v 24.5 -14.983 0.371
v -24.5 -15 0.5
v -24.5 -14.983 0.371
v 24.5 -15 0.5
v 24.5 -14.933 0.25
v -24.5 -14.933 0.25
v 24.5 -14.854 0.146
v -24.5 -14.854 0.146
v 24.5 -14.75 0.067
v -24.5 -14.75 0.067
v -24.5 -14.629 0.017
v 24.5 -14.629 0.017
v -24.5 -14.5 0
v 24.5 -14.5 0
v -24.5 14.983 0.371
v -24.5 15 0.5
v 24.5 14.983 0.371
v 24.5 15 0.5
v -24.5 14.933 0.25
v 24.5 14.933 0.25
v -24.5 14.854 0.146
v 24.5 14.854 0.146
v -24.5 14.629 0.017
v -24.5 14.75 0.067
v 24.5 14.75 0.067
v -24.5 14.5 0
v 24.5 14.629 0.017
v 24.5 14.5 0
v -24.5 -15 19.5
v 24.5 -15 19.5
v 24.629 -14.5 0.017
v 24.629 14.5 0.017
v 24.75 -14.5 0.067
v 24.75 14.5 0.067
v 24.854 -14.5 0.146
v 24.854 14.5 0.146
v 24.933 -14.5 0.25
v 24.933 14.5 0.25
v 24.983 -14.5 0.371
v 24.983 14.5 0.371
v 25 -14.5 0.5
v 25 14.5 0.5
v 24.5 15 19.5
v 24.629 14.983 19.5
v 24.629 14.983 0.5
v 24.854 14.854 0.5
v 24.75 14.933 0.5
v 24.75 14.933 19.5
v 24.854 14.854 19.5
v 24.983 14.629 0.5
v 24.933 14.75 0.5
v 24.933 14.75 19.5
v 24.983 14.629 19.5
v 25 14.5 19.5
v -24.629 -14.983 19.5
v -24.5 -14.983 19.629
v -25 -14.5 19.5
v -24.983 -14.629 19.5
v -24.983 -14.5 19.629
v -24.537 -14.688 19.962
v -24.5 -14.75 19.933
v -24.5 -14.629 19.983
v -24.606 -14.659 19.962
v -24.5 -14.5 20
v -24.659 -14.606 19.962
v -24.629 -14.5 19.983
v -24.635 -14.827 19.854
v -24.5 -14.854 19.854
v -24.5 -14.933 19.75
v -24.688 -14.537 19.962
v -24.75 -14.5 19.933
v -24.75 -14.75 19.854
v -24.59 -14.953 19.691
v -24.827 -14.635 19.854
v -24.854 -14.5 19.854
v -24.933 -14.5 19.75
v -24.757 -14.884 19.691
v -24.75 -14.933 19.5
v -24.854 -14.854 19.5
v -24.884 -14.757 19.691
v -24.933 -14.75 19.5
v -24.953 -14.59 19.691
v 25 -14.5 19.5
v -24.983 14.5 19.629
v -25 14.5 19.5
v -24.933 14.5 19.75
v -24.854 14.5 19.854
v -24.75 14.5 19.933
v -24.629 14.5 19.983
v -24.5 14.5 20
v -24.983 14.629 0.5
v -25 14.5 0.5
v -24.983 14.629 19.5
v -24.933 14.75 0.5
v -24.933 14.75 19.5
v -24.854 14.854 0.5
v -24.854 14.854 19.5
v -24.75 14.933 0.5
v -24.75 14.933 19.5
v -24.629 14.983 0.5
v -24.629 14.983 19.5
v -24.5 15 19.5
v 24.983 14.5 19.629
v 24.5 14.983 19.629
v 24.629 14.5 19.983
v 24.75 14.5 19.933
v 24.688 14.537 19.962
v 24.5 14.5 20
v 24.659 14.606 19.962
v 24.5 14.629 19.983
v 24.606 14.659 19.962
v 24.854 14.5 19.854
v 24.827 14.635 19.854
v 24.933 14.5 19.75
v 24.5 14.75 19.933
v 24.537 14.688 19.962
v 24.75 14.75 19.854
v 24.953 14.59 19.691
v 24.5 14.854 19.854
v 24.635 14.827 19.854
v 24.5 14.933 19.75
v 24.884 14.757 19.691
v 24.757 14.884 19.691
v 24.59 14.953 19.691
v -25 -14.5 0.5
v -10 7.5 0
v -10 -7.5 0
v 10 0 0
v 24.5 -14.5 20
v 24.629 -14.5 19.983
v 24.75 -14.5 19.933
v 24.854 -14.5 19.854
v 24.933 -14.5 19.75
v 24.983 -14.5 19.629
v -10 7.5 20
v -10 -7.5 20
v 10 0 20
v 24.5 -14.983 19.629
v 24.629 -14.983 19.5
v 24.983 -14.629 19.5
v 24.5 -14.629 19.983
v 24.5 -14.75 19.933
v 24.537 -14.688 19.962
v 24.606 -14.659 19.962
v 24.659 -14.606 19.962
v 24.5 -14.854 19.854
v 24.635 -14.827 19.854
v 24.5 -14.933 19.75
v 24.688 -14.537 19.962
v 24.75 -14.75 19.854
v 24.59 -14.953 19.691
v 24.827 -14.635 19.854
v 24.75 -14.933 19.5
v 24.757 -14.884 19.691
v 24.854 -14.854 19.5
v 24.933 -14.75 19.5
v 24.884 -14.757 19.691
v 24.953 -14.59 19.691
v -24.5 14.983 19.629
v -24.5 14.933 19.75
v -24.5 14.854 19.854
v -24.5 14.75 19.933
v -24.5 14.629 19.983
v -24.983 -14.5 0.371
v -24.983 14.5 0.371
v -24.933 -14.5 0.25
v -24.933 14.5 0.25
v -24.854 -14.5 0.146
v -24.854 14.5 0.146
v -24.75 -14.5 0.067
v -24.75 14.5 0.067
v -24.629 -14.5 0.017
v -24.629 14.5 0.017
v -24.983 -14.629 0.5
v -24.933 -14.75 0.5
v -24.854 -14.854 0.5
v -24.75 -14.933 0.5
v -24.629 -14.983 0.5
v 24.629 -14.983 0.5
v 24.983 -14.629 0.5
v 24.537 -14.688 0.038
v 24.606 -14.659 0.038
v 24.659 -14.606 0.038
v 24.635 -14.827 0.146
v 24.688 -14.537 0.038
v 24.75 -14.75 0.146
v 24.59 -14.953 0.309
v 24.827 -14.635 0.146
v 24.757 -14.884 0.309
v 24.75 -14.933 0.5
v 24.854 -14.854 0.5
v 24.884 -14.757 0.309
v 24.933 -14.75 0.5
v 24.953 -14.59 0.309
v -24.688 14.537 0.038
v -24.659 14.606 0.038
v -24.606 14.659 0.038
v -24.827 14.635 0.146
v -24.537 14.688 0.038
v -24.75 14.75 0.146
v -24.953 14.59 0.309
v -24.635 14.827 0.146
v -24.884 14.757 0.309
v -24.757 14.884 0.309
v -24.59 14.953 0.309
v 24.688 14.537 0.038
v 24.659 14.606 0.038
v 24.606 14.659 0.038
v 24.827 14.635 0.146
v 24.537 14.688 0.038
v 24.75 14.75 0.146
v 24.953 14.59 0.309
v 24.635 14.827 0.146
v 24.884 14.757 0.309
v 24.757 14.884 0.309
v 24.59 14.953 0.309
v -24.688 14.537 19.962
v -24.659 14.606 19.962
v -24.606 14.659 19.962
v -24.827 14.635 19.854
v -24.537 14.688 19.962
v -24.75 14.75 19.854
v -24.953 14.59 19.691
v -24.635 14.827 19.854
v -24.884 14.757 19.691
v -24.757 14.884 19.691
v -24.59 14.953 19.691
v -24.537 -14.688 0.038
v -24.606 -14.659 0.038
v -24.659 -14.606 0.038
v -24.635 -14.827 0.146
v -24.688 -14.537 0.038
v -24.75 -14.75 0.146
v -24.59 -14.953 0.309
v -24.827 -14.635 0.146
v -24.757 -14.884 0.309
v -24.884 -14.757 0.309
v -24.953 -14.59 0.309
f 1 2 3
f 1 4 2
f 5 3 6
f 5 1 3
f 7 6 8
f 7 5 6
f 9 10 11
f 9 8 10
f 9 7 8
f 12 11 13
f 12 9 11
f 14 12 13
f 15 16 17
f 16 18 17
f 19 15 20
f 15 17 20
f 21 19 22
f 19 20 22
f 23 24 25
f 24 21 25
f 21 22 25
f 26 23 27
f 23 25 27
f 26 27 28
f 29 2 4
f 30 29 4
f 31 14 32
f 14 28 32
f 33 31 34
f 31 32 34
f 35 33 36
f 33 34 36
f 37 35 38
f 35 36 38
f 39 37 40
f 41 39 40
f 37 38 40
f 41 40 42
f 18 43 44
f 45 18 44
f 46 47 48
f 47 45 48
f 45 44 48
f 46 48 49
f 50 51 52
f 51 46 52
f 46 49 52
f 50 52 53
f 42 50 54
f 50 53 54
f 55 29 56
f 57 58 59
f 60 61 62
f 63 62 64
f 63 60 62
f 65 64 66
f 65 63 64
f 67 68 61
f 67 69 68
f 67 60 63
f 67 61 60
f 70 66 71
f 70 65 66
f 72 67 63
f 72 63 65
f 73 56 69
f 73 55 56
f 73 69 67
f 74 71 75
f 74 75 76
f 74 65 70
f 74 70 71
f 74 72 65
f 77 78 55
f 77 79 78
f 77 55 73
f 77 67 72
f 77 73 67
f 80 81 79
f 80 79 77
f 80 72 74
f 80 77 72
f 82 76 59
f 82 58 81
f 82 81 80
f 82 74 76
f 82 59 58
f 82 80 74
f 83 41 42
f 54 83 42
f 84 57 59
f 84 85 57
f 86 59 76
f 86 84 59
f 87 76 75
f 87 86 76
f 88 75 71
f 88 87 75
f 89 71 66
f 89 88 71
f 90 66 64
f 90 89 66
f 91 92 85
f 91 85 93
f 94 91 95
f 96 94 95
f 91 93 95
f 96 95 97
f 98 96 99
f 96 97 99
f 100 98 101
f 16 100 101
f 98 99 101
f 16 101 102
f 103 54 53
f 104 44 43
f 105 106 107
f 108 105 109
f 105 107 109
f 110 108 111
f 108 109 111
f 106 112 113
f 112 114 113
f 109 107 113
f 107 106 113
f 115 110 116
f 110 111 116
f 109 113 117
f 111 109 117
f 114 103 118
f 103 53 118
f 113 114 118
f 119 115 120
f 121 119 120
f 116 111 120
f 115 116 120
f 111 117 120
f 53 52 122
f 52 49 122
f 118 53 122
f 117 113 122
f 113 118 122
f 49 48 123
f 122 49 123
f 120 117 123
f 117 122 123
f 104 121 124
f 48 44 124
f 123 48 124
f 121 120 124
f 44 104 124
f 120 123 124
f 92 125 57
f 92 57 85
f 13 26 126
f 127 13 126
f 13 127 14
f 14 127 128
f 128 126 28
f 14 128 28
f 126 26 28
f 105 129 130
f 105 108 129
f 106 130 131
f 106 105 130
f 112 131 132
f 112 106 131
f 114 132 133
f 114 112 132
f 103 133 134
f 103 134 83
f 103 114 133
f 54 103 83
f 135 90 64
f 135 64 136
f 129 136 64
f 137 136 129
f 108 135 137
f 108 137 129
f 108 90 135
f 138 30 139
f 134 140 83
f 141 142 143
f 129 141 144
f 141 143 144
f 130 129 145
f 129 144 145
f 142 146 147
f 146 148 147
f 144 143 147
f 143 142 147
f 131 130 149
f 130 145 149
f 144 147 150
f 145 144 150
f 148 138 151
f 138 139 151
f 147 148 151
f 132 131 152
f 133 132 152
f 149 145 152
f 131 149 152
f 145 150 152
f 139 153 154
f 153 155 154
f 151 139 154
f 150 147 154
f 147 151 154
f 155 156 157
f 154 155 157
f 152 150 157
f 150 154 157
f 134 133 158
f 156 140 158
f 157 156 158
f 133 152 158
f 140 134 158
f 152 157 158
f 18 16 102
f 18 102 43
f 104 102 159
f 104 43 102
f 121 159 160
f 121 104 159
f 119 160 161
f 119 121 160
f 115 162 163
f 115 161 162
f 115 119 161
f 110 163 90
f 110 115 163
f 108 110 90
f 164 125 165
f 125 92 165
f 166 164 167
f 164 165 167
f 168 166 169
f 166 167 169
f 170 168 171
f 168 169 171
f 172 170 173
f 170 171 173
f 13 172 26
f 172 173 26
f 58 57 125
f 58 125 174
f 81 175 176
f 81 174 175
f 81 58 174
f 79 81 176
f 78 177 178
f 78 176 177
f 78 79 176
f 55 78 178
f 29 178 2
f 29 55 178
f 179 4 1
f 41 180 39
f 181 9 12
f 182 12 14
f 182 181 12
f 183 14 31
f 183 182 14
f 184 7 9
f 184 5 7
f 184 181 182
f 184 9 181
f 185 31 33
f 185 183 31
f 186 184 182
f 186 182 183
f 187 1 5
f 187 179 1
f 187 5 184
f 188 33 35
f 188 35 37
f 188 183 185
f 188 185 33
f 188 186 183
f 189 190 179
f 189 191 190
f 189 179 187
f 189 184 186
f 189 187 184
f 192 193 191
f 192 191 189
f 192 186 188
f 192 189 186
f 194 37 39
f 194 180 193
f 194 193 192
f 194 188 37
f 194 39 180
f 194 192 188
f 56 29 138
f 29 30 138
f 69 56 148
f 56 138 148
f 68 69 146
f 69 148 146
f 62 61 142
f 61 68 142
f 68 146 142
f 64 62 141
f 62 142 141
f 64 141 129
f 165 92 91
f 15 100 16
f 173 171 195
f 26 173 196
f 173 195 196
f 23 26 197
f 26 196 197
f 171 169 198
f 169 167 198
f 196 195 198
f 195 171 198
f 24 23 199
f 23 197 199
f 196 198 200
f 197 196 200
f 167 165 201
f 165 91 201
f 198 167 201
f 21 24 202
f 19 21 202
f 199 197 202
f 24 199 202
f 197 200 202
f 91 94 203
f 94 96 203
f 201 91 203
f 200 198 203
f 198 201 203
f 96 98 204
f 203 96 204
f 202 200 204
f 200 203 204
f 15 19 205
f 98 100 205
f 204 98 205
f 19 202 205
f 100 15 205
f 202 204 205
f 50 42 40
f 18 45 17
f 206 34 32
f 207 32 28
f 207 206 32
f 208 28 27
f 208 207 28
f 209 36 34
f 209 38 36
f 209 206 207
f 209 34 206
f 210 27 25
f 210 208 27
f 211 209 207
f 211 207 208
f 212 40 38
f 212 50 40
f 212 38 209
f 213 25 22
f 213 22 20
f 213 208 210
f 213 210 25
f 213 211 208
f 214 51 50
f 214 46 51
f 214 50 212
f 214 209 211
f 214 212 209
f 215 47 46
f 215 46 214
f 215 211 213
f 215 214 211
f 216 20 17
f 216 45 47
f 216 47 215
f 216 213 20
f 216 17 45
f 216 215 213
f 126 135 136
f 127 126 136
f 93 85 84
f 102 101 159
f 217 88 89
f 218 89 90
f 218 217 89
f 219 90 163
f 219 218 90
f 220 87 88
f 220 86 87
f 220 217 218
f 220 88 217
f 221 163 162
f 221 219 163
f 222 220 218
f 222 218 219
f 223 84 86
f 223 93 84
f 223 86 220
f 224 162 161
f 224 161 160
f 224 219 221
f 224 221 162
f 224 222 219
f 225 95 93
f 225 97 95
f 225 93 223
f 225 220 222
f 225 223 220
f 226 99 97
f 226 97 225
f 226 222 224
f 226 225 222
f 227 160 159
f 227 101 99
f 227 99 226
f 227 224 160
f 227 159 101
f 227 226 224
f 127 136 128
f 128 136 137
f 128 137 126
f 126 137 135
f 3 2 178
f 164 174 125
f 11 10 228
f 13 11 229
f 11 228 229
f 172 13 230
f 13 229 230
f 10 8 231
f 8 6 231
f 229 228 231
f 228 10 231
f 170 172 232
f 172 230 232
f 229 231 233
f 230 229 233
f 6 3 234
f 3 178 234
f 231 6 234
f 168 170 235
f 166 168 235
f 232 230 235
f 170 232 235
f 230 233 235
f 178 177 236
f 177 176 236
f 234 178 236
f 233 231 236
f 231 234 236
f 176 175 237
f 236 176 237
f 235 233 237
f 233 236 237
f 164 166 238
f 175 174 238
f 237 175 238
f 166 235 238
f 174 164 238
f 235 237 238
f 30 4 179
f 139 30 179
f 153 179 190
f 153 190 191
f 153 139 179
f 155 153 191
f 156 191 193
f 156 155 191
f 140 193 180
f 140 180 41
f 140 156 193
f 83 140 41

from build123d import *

# Parameters (mm, degrees)
F0_W     = 50
F0_H     = 30
F1_DEPTH = 20
F3_DEPTH = 20.001
F4_R     = 0.5


with BuildPart() as f1:
    # F0 (on Top) → F1 (new body)
    with BuildSketch(Plane.XY):
        Rectangle(F0_W, F0_H)
    extrude(amount=F1_DEPTH)

    # F2 (on face) → F3 (cut, through all)
    with BuildSketch(Plane.XY.offset(20)):
        Polygon((10, 0), (-10, 7.5), (-10, -7.5), align=None)
    extrude(amount=-F3_DEPTH, mode=Mode.SUBTRACT)

    # F4
    f4_edges = [f1.edges().sort_by_distance(p)[0] for p in [
        (-25, -15, 10),
        (25, -15, 10),
        (0, -15, 0),
        (0, -15, 20),
        (-25, 15, 10),
        (-25, 0, 0),
        (-25, 0, 20),
        (25, 15, 10),
        (25, 0, 0),
        (25, 0, 20),
        (0, 15, 0),
        (0, 15, 20),
    ]]
    fillet(f4_edges, radius=F4_R)


solid = f1.part
